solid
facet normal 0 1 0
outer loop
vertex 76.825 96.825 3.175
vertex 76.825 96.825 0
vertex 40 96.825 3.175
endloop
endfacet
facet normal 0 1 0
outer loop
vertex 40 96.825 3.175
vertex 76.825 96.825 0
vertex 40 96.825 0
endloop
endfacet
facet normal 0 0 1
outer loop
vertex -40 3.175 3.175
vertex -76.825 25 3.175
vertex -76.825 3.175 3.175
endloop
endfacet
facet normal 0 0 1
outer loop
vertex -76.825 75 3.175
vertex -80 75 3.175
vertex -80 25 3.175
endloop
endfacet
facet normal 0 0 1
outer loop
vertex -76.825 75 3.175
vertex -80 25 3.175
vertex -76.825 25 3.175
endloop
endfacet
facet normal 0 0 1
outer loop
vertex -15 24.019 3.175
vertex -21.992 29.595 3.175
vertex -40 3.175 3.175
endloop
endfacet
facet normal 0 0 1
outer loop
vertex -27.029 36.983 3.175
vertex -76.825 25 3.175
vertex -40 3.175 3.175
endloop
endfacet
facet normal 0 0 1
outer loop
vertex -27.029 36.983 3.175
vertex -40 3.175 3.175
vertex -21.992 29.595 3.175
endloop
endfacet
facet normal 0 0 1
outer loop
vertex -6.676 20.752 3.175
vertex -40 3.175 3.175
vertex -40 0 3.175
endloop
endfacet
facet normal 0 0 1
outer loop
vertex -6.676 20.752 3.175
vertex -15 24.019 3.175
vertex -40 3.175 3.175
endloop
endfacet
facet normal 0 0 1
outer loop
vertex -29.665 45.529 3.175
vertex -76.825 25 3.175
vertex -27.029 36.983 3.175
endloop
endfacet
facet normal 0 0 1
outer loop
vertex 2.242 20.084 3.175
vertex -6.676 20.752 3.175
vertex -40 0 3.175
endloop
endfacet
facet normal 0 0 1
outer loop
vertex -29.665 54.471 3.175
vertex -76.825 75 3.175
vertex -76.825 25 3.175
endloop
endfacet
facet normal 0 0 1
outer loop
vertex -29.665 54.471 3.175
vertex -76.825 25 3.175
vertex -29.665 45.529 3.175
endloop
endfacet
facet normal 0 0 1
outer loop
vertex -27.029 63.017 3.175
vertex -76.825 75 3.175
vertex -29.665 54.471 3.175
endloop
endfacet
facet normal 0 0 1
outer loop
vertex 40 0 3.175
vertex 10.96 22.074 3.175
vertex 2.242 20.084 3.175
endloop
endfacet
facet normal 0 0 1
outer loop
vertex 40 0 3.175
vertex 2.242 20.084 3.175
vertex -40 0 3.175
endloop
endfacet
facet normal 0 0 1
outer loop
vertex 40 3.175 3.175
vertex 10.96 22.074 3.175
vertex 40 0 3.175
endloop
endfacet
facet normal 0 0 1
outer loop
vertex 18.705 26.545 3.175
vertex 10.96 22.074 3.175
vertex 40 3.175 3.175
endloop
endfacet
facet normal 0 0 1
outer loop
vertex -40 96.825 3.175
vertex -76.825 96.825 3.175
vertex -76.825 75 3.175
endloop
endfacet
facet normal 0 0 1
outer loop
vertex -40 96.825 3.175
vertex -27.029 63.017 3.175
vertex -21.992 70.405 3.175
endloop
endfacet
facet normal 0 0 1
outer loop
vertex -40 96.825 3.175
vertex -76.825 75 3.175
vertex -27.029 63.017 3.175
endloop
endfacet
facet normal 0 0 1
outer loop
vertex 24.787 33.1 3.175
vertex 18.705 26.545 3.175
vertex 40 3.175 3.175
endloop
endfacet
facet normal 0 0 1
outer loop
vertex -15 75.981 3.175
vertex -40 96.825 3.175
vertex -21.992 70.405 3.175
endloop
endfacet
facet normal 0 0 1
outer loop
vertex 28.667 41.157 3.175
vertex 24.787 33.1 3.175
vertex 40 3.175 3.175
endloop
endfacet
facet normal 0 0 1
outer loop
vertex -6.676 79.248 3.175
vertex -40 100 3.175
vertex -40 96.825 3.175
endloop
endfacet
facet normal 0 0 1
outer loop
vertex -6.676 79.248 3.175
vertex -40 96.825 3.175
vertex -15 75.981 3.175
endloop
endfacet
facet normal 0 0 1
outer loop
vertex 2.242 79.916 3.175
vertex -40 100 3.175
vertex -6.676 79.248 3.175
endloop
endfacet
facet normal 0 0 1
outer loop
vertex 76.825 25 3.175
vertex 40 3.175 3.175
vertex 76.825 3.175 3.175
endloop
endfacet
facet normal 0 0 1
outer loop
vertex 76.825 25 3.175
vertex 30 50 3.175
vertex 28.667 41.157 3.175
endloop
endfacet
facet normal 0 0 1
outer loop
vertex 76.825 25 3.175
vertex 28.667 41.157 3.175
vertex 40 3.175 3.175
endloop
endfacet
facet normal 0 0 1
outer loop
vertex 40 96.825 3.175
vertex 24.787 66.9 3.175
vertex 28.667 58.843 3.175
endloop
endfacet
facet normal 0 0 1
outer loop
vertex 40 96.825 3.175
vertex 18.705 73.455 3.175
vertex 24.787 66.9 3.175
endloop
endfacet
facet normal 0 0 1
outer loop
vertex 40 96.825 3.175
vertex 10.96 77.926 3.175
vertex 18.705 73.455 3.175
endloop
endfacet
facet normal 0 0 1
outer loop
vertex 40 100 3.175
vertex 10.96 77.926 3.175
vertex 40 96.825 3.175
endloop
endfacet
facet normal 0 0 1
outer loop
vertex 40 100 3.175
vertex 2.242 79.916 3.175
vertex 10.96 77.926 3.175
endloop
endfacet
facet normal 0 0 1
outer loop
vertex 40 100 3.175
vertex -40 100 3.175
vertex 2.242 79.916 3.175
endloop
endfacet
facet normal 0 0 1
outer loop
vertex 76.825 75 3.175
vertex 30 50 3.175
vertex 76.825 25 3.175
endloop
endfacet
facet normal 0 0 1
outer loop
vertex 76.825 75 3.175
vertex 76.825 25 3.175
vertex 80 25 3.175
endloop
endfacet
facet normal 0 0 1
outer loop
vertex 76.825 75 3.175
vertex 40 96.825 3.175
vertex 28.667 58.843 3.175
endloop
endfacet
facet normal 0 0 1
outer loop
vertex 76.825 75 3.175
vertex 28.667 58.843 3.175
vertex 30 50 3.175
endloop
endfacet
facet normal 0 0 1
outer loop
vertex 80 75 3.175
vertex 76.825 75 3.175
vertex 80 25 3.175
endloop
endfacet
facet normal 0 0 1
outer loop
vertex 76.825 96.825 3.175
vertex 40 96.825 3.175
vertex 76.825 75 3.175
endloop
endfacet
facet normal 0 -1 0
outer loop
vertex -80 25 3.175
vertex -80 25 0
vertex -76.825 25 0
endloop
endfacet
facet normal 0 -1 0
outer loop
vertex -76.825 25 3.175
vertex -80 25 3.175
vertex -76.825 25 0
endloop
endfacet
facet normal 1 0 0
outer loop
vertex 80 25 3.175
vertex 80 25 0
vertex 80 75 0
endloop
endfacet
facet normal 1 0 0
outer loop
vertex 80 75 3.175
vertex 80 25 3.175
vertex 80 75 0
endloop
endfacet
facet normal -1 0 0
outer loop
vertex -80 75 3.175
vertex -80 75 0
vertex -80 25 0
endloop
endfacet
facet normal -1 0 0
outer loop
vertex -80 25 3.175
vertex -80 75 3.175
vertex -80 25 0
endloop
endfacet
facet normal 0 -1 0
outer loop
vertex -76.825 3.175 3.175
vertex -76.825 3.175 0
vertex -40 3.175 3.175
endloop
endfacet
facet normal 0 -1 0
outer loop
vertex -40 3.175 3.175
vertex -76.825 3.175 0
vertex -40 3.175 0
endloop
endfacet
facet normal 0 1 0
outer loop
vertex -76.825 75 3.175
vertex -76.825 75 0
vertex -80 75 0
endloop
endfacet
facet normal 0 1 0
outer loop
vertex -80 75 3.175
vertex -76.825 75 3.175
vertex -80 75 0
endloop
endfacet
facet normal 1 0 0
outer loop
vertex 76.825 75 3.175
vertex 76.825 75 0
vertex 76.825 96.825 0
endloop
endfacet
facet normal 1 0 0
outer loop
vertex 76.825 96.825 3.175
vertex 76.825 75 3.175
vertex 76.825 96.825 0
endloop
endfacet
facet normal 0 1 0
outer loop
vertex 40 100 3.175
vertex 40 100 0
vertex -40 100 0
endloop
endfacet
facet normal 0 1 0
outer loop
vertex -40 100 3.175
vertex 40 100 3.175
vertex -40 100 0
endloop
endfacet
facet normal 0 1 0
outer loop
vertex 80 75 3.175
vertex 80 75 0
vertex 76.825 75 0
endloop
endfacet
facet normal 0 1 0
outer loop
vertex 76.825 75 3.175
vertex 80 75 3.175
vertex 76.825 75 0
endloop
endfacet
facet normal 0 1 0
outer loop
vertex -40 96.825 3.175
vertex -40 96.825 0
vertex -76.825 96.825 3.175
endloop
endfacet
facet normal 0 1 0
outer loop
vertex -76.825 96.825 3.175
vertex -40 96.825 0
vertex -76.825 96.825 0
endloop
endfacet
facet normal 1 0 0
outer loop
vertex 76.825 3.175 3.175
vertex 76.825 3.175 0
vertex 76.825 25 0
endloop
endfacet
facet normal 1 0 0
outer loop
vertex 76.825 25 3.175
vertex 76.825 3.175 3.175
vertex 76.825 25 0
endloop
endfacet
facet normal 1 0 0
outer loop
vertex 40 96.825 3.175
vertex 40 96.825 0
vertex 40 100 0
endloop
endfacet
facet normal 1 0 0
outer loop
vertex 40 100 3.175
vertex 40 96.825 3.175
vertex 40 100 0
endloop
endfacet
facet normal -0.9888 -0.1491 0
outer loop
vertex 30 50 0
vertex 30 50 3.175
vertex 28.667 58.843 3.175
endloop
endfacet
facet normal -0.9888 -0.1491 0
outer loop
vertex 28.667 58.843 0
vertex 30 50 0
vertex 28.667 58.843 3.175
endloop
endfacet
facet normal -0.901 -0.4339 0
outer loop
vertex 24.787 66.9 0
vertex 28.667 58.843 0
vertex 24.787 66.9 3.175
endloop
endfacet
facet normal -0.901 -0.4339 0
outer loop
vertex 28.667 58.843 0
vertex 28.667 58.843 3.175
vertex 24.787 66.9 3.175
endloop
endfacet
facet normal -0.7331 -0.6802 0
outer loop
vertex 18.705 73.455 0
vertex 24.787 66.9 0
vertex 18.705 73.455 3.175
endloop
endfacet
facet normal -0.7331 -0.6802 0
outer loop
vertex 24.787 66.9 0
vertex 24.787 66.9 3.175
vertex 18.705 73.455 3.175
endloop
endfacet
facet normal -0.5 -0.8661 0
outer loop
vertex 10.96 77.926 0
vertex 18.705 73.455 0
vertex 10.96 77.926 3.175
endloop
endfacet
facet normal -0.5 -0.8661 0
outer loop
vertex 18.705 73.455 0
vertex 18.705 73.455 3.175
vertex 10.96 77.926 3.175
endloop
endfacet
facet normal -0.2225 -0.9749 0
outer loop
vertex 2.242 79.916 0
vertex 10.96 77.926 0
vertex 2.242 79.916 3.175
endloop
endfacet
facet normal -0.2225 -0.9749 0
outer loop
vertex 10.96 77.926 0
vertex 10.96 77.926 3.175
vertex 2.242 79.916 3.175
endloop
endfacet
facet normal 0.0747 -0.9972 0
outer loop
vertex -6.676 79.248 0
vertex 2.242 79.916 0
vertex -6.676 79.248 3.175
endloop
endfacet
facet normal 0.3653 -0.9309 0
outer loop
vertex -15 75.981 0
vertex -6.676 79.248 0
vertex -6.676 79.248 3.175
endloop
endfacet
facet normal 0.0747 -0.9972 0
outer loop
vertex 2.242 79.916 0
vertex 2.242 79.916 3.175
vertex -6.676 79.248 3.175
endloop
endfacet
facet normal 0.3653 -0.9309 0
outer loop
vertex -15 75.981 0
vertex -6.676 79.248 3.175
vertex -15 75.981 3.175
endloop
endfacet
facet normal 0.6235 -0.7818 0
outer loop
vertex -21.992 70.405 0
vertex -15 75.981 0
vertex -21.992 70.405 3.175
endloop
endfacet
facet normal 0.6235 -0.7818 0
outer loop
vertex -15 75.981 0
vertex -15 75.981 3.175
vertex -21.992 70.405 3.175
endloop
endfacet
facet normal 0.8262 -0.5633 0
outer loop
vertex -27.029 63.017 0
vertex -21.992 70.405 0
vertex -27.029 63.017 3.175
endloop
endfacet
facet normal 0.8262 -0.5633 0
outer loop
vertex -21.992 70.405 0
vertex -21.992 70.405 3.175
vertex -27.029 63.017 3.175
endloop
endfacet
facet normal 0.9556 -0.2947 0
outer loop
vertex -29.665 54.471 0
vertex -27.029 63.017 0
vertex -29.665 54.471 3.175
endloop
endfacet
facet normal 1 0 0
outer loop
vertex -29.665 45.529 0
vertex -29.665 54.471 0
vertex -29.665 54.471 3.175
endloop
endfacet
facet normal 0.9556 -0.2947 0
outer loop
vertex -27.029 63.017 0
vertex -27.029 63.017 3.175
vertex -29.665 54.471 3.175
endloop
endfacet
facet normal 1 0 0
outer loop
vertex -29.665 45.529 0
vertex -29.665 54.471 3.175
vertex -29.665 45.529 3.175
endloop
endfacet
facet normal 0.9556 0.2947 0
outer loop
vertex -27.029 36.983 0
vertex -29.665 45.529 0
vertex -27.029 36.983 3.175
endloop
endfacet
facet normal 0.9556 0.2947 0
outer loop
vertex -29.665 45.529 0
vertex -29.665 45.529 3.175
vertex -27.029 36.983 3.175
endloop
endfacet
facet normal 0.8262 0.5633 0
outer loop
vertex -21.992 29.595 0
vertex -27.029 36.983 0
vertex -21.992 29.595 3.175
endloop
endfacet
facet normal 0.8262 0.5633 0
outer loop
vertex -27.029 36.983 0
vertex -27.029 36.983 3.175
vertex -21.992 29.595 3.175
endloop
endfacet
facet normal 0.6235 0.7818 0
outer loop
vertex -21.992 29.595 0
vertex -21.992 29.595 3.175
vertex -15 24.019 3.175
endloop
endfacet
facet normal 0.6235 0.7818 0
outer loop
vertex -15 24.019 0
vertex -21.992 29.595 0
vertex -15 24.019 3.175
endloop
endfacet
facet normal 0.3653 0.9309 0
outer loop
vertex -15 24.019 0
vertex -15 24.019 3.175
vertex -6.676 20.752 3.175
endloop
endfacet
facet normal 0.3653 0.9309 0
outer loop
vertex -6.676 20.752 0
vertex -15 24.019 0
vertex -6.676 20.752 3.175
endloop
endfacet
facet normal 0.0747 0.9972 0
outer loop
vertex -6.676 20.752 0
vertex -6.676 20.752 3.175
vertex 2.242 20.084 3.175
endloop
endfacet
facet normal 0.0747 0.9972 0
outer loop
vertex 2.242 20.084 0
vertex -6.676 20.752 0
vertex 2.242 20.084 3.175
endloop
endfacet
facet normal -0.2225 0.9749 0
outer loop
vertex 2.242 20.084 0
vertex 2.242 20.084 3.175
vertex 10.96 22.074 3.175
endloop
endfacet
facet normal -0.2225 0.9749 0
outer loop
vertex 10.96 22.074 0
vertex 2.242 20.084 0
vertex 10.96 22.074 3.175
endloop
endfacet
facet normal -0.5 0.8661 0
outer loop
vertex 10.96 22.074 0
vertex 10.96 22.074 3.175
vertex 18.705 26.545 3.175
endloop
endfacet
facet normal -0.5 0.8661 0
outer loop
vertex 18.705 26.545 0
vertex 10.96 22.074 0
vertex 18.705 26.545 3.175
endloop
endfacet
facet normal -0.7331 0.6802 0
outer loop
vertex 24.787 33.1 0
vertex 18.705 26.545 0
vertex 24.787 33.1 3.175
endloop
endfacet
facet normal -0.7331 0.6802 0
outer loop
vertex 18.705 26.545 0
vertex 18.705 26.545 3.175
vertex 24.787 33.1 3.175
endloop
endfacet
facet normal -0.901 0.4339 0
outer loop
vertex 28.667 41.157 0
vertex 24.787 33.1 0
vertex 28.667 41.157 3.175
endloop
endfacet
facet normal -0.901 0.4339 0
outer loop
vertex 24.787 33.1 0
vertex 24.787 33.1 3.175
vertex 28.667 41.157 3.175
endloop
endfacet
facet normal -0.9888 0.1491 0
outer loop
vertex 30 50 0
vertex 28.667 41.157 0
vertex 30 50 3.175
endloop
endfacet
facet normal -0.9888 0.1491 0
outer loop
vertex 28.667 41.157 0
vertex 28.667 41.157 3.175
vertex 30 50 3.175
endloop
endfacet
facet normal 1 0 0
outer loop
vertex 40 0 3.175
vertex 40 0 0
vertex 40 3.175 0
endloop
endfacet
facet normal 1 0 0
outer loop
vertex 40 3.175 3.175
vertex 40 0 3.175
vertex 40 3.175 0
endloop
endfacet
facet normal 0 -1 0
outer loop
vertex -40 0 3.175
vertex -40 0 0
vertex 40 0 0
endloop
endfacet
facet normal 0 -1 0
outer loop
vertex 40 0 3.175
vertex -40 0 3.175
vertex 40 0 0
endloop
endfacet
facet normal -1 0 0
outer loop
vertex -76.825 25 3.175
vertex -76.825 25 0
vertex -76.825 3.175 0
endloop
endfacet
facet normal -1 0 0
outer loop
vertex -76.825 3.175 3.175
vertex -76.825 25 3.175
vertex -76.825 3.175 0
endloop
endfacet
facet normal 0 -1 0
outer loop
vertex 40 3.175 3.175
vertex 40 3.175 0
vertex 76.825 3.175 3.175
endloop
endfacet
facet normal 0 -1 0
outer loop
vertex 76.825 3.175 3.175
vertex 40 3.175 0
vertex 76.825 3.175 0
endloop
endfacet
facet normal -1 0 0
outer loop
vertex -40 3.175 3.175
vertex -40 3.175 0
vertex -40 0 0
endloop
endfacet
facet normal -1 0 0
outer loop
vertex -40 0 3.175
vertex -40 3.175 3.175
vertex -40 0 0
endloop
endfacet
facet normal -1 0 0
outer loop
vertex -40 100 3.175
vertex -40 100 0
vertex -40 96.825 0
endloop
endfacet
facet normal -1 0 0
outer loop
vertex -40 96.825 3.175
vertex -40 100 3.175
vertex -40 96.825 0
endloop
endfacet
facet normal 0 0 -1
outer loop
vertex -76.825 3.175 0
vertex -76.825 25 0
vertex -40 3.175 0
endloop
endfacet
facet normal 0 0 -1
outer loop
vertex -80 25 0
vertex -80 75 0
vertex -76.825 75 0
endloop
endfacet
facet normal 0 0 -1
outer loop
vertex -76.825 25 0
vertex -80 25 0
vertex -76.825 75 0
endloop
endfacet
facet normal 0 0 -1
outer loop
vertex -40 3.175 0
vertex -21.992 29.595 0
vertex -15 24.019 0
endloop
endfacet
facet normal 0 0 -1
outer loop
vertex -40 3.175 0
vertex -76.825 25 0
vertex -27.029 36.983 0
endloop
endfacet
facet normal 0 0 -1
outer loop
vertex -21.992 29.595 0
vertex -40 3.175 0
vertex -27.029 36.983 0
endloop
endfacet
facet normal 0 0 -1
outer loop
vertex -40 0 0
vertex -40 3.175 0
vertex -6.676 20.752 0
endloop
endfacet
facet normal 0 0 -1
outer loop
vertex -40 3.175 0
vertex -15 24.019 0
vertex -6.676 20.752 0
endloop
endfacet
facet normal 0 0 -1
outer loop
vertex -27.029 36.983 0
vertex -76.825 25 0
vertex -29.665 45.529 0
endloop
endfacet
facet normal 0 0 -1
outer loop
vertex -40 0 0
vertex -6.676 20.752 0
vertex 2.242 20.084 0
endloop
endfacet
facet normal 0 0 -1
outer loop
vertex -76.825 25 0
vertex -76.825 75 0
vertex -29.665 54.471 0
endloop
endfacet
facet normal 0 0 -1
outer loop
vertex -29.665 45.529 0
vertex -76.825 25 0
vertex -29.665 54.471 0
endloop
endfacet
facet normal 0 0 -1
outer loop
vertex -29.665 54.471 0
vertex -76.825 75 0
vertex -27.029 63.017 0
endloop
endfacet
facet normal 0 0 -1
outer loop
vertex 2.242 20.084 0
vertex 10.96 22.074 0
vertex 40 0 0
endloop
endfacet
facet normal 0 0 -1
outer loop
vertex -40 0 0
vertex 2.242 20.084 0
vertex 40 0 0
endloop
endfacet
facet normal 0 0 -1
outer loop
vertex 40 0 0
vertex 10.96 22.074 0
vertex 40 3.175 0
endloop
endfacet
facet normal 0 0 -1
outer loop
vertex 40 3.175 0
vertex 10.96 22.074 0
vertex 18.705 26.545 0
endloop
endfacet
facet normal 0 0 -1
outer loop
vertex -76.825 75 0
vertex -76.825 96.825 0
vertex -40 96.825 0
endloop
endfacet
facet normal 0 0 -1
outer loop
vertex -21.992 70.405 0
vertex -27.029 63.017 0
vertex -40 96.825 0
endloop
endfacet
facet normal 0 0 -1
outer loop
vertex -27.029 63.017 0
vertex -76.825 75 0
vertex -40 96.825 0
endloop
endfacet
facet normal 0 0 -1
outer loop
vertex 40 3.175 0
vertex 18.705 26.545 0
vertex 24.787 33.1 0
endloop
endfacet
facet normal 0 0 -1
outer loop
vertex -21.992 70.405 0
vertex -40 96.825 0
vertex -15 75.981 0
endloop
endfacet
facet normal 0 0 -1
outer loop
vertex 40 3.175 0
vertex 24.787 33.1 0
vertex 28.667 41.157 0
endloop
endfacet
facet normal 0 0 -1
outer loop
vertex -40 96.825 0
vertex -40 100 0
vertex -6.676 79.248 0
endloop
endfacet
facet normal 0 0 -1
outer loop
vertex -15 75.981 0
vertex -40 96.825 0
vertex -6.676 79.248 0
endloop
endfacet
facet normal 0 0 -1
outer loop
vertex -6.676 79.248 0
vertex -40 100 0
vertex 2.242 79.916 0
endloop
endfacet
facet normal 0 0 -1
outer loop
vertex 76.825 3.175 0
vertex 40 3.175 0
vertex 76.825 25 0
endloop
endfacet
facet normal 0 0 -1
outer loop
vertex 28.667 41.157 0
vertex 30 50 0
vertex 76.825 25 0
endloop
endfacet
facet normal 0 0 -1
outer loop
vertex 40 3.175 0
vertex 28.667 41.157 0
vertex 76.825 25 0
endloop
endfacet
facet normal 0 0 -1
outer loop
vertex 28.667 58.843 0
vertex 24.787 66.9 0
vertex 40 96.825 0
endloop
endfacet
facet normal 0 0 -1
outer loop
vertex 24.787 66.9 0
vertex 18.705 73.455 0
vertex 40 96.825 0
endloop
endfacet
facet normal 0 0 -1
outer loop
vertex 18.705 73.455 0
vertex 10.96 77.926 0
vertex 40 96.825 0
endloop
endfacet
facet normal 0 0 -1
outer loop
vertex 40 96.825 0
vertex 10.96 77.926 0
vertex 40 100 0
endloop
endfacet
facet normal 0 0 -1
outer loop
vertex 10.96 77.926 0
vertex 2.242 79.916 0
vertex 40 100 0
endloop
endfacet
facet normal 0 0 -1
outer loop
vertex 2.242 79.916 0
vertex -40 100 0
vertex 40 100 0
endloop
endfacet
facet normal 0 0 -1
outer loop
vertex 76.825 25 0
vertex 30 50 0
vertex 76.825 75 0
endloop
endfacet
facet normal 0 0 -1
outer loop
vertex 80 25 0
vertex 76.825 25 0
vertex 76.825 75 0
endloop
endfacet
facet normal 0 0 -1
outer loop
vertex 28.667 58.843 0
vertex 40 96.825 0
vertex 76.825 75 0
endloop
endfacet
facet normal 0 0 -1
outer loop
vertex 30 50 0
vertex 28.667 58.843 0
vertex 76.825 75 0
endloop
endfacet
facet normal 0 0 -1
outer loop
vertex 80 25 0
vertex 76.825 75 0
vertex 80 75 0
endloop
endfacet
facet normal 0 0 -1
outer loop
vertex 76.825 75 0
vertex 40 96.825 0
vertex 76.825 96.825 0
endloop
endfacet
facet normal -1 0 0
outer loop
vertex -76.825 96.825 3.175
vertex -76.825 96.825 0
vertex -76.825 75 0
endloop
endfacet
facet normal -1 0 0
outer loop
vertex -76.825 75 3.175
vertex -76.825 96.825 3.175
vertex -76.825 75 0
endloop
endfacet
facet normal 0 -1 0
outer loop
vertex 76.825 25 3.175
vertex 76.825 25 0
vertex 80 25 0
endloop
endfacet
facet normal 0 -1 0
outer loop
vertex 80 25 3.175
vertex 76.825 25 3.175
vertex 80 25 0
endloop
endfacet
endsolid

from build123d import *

# Parameters (mm, degrees)
BOSS_EXTRUDE2_DEPTH = 3.175
SKETCH2_R           = 30
CUT_EXTRUDE1_DEPTH  = 3.175


with BuildPart() as part:
    # Sketch1 → Boss-Extrude2 (new body)
    with BuildSketch(Plane.XY):
        Polygon((-40, 0), (40, 0), (40, 3.175), (76.825, 3.175), (76.825, 25), (80, 25), (80, 75), (76.825, 75), (76.825, 96.825), (40, 96.825), (40, 100), (-40, 100), (-40, 96.825), (-76.825, 96.825), (-76.825, 75), (-80, 75), (-80, 25), (-76.825, 25), (-76.825, 3.175), (-40, 3.175), align=None)
    extrude(amount=BOSS_EXTRUDE2_DEPTH)

    # Sketch2 → Cut-Extrude1 (cut)
    with BuildSketch(Plane.XY.offset(3.175)):
        with Locations((0, 50)):
            Circle(SKETCH2_R)
    extrude(amount=-CUT_EXTRUDE1_DEPTH, mode=Mode.SUBTRACT)


solid = part.part
